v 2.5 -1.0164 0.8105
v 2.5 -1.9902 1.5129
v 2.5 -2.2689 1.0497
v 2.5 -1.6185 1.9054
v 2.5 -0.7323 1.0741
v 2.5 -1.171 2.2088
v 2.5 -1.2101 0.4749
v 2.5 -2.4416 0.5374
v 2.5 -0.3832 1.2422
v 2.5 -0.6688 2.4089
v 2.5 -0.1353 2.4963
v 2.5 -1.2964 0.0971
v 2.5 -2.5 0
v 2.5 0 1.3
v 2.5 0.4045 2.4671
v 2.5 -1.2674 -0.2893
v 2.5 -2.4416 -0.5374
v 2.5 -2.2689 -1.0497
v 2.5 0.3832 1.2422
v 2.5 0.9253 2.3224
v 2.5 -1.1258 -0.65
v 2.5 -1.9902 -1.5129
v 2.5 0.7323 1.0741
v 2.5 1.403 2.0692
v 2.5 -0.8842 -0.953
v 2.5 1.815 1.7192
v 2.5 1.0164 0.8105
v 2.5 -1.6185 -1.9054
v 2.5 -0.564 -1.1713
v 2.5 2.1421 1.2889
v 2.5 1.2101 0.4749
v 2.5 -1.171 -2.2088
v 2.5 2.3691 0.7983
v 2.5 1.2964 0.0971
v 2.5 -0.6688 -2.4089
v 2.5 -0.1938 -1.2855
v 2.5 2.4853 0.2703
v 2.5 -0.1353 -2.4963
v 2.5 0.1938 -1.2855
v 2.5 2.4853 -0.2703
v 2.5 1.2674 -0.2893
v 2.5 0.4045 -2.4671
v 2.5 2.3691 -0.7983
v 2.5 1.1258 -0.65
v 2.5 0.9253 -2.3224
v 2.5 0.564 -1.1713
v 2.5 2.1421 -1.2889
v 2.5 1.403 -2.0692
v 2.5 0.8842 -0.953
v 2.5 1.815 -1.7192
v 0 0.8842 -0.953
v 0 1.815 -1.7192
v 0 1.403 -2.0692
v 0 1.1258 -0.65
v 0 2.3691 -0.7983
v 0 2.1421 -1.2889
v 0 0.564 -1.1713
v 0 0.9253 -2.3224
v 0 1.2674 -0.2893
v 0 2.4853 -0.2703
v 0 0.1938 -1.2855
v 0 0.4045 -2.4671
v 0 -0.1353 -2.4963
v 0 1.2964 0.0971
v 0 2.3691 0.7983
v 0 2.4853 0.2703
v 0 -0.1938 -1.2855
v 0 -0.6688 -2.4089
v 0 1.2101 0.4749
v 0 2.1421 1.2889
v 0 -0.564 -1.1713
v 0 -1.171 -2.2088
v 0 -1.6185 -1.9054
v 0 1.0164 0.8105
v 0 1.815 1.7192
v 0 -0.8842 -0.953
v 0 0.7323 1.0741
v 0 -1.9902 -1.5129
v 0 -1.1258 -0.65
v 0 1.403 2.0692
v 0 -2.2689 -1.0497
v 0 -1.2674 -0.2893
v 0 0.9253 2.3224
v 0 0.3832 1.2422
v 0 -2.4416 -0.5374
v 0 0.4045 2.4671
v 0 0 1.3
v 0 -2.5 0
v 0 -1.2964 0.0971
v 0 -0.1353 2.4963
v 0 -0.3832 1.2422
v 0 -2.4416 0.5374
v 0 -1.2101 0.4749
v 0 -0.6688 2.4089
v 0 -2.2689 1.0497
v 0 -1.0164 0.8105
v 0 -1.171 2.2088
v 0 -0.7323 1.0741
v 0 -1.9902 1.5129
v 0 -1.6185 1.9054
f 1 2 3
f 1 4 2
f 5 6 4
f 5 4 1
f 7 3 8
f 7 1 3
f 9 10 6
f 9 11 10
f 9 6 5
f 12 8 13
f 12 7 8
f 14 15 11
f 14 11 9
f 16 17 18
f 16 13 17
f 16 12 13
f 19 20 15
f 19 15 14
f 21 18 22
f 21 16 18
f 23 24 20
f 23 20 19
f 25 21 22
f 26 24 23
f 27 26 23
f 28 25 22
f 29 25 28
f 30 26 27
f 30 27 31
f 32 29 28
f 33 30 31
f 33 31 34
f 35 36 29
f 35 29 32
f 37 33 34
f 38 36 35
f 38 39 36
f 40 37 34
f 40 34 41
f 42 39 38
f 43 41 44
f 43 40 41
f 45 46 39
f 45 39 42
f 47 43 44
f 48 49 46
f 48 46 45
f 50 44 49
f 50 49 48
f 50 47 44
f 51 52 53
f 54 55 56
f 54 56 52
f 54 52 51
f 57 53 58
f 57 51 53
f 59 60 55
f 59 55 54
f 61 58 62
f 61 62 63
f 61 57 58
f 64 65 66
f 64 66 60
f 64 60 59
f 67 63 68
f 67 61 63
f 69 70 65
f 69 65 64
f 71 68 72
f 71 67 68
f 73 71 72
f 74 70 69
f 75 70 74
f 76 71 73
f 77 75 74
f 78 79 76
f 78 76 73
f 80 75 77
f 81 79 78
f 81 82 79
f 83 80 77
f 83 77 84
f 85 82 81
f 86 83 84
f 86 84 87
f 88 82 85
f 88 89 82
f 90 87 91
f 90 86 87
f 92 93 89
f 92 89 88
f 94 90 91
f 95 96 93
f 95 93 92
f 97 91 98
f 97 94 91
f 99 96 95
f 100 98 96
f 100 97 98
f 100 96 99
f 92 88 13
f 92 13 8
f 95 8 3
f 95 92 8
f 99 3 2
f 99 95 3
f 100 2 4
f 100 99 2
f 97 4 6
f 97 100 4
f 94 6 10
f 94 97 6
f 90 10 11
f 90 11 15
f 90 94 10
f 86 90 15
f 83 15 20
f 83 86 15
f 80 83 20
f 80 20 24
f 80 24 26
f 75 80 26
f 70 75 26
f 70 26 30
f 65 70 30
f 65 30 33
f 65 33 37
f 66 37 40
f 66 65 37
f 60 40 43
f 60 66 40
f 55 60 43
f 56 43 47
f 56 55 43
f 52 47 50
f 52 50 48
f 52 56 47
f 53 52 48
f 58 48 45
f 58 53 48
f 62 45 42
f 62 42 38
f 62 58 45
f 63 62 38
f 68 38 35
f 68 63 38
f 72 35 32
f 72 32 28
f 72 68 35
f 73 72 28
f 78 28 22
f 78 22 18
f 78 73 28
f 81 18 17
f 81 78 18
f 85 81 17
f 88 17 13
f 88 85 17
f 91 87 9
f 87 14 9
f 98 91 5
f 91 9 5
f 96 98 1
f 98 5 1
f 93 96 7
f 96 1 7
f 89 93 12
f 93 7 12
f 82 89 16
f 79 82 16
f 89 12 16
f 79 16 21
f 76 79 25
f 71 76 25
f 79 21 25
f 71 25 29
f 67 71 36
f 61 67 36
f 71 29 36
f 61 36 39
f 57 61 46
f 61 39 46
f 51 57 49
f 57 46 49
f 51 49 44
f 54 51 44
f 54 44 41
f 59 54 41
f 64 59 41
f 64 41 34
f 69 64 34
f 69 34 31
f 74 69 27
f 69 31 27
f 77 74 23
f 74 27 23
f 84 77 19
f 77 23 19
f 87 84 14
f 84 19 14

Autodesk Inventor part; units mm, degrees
ref_plane "YZ Plane" through (0, 0, 0) normal (1, 0, 0) x (0, 1, 0)
ref_plane "XZ Plane" through (0, 0, 0) normal (0, 1, 0) x (-1, 0, 0)
ref_plane "XY Plane" through (0, 0, 0) normal (0, 0, 1) x (1, 0, 0)
sketch "Sketch_1" plane through (0, 0, 0) normal (0, 0, 1) x (1, 0, 0)
  line L0 (0, 0) -> (4.5, 0)
  line L1 (4.5, 0) -> (4.5, -2.5)
  line L2 (4.5, -2.5) -> (0, -2.5)
  line L3 (0, -2.5) -> (0, 0)
  line L4 (0, 0) -> (4.5, 0)
revolve "Revolution1" add sketch "Sketch_1" angle 360 about axis through (0, 0, 0) along (-1, 0, 0)
sketch "Sketch2" plane through (0, 0, 0) normal (-1, 0, 0) x (0, 0, 1)
  point P0 (0, 0)
hole "Hole1" at (0, 0, 0) direction (1, 0, 0) diameter 2.6 depth 4.5
sketch "スケッチ3" plane through (4.5, 0, 0) normal (1, 0, 0) x (0, 0, -1)
  circle A0 centre (0, 0) radius 1.3
  circle A1 centre (0, 0) radius 2.5
extrude "押し出し1" cut sketch "スケッチ3" against normal blind 2
properties part number "FWSJJ-D5-V2_6-T2_5"
